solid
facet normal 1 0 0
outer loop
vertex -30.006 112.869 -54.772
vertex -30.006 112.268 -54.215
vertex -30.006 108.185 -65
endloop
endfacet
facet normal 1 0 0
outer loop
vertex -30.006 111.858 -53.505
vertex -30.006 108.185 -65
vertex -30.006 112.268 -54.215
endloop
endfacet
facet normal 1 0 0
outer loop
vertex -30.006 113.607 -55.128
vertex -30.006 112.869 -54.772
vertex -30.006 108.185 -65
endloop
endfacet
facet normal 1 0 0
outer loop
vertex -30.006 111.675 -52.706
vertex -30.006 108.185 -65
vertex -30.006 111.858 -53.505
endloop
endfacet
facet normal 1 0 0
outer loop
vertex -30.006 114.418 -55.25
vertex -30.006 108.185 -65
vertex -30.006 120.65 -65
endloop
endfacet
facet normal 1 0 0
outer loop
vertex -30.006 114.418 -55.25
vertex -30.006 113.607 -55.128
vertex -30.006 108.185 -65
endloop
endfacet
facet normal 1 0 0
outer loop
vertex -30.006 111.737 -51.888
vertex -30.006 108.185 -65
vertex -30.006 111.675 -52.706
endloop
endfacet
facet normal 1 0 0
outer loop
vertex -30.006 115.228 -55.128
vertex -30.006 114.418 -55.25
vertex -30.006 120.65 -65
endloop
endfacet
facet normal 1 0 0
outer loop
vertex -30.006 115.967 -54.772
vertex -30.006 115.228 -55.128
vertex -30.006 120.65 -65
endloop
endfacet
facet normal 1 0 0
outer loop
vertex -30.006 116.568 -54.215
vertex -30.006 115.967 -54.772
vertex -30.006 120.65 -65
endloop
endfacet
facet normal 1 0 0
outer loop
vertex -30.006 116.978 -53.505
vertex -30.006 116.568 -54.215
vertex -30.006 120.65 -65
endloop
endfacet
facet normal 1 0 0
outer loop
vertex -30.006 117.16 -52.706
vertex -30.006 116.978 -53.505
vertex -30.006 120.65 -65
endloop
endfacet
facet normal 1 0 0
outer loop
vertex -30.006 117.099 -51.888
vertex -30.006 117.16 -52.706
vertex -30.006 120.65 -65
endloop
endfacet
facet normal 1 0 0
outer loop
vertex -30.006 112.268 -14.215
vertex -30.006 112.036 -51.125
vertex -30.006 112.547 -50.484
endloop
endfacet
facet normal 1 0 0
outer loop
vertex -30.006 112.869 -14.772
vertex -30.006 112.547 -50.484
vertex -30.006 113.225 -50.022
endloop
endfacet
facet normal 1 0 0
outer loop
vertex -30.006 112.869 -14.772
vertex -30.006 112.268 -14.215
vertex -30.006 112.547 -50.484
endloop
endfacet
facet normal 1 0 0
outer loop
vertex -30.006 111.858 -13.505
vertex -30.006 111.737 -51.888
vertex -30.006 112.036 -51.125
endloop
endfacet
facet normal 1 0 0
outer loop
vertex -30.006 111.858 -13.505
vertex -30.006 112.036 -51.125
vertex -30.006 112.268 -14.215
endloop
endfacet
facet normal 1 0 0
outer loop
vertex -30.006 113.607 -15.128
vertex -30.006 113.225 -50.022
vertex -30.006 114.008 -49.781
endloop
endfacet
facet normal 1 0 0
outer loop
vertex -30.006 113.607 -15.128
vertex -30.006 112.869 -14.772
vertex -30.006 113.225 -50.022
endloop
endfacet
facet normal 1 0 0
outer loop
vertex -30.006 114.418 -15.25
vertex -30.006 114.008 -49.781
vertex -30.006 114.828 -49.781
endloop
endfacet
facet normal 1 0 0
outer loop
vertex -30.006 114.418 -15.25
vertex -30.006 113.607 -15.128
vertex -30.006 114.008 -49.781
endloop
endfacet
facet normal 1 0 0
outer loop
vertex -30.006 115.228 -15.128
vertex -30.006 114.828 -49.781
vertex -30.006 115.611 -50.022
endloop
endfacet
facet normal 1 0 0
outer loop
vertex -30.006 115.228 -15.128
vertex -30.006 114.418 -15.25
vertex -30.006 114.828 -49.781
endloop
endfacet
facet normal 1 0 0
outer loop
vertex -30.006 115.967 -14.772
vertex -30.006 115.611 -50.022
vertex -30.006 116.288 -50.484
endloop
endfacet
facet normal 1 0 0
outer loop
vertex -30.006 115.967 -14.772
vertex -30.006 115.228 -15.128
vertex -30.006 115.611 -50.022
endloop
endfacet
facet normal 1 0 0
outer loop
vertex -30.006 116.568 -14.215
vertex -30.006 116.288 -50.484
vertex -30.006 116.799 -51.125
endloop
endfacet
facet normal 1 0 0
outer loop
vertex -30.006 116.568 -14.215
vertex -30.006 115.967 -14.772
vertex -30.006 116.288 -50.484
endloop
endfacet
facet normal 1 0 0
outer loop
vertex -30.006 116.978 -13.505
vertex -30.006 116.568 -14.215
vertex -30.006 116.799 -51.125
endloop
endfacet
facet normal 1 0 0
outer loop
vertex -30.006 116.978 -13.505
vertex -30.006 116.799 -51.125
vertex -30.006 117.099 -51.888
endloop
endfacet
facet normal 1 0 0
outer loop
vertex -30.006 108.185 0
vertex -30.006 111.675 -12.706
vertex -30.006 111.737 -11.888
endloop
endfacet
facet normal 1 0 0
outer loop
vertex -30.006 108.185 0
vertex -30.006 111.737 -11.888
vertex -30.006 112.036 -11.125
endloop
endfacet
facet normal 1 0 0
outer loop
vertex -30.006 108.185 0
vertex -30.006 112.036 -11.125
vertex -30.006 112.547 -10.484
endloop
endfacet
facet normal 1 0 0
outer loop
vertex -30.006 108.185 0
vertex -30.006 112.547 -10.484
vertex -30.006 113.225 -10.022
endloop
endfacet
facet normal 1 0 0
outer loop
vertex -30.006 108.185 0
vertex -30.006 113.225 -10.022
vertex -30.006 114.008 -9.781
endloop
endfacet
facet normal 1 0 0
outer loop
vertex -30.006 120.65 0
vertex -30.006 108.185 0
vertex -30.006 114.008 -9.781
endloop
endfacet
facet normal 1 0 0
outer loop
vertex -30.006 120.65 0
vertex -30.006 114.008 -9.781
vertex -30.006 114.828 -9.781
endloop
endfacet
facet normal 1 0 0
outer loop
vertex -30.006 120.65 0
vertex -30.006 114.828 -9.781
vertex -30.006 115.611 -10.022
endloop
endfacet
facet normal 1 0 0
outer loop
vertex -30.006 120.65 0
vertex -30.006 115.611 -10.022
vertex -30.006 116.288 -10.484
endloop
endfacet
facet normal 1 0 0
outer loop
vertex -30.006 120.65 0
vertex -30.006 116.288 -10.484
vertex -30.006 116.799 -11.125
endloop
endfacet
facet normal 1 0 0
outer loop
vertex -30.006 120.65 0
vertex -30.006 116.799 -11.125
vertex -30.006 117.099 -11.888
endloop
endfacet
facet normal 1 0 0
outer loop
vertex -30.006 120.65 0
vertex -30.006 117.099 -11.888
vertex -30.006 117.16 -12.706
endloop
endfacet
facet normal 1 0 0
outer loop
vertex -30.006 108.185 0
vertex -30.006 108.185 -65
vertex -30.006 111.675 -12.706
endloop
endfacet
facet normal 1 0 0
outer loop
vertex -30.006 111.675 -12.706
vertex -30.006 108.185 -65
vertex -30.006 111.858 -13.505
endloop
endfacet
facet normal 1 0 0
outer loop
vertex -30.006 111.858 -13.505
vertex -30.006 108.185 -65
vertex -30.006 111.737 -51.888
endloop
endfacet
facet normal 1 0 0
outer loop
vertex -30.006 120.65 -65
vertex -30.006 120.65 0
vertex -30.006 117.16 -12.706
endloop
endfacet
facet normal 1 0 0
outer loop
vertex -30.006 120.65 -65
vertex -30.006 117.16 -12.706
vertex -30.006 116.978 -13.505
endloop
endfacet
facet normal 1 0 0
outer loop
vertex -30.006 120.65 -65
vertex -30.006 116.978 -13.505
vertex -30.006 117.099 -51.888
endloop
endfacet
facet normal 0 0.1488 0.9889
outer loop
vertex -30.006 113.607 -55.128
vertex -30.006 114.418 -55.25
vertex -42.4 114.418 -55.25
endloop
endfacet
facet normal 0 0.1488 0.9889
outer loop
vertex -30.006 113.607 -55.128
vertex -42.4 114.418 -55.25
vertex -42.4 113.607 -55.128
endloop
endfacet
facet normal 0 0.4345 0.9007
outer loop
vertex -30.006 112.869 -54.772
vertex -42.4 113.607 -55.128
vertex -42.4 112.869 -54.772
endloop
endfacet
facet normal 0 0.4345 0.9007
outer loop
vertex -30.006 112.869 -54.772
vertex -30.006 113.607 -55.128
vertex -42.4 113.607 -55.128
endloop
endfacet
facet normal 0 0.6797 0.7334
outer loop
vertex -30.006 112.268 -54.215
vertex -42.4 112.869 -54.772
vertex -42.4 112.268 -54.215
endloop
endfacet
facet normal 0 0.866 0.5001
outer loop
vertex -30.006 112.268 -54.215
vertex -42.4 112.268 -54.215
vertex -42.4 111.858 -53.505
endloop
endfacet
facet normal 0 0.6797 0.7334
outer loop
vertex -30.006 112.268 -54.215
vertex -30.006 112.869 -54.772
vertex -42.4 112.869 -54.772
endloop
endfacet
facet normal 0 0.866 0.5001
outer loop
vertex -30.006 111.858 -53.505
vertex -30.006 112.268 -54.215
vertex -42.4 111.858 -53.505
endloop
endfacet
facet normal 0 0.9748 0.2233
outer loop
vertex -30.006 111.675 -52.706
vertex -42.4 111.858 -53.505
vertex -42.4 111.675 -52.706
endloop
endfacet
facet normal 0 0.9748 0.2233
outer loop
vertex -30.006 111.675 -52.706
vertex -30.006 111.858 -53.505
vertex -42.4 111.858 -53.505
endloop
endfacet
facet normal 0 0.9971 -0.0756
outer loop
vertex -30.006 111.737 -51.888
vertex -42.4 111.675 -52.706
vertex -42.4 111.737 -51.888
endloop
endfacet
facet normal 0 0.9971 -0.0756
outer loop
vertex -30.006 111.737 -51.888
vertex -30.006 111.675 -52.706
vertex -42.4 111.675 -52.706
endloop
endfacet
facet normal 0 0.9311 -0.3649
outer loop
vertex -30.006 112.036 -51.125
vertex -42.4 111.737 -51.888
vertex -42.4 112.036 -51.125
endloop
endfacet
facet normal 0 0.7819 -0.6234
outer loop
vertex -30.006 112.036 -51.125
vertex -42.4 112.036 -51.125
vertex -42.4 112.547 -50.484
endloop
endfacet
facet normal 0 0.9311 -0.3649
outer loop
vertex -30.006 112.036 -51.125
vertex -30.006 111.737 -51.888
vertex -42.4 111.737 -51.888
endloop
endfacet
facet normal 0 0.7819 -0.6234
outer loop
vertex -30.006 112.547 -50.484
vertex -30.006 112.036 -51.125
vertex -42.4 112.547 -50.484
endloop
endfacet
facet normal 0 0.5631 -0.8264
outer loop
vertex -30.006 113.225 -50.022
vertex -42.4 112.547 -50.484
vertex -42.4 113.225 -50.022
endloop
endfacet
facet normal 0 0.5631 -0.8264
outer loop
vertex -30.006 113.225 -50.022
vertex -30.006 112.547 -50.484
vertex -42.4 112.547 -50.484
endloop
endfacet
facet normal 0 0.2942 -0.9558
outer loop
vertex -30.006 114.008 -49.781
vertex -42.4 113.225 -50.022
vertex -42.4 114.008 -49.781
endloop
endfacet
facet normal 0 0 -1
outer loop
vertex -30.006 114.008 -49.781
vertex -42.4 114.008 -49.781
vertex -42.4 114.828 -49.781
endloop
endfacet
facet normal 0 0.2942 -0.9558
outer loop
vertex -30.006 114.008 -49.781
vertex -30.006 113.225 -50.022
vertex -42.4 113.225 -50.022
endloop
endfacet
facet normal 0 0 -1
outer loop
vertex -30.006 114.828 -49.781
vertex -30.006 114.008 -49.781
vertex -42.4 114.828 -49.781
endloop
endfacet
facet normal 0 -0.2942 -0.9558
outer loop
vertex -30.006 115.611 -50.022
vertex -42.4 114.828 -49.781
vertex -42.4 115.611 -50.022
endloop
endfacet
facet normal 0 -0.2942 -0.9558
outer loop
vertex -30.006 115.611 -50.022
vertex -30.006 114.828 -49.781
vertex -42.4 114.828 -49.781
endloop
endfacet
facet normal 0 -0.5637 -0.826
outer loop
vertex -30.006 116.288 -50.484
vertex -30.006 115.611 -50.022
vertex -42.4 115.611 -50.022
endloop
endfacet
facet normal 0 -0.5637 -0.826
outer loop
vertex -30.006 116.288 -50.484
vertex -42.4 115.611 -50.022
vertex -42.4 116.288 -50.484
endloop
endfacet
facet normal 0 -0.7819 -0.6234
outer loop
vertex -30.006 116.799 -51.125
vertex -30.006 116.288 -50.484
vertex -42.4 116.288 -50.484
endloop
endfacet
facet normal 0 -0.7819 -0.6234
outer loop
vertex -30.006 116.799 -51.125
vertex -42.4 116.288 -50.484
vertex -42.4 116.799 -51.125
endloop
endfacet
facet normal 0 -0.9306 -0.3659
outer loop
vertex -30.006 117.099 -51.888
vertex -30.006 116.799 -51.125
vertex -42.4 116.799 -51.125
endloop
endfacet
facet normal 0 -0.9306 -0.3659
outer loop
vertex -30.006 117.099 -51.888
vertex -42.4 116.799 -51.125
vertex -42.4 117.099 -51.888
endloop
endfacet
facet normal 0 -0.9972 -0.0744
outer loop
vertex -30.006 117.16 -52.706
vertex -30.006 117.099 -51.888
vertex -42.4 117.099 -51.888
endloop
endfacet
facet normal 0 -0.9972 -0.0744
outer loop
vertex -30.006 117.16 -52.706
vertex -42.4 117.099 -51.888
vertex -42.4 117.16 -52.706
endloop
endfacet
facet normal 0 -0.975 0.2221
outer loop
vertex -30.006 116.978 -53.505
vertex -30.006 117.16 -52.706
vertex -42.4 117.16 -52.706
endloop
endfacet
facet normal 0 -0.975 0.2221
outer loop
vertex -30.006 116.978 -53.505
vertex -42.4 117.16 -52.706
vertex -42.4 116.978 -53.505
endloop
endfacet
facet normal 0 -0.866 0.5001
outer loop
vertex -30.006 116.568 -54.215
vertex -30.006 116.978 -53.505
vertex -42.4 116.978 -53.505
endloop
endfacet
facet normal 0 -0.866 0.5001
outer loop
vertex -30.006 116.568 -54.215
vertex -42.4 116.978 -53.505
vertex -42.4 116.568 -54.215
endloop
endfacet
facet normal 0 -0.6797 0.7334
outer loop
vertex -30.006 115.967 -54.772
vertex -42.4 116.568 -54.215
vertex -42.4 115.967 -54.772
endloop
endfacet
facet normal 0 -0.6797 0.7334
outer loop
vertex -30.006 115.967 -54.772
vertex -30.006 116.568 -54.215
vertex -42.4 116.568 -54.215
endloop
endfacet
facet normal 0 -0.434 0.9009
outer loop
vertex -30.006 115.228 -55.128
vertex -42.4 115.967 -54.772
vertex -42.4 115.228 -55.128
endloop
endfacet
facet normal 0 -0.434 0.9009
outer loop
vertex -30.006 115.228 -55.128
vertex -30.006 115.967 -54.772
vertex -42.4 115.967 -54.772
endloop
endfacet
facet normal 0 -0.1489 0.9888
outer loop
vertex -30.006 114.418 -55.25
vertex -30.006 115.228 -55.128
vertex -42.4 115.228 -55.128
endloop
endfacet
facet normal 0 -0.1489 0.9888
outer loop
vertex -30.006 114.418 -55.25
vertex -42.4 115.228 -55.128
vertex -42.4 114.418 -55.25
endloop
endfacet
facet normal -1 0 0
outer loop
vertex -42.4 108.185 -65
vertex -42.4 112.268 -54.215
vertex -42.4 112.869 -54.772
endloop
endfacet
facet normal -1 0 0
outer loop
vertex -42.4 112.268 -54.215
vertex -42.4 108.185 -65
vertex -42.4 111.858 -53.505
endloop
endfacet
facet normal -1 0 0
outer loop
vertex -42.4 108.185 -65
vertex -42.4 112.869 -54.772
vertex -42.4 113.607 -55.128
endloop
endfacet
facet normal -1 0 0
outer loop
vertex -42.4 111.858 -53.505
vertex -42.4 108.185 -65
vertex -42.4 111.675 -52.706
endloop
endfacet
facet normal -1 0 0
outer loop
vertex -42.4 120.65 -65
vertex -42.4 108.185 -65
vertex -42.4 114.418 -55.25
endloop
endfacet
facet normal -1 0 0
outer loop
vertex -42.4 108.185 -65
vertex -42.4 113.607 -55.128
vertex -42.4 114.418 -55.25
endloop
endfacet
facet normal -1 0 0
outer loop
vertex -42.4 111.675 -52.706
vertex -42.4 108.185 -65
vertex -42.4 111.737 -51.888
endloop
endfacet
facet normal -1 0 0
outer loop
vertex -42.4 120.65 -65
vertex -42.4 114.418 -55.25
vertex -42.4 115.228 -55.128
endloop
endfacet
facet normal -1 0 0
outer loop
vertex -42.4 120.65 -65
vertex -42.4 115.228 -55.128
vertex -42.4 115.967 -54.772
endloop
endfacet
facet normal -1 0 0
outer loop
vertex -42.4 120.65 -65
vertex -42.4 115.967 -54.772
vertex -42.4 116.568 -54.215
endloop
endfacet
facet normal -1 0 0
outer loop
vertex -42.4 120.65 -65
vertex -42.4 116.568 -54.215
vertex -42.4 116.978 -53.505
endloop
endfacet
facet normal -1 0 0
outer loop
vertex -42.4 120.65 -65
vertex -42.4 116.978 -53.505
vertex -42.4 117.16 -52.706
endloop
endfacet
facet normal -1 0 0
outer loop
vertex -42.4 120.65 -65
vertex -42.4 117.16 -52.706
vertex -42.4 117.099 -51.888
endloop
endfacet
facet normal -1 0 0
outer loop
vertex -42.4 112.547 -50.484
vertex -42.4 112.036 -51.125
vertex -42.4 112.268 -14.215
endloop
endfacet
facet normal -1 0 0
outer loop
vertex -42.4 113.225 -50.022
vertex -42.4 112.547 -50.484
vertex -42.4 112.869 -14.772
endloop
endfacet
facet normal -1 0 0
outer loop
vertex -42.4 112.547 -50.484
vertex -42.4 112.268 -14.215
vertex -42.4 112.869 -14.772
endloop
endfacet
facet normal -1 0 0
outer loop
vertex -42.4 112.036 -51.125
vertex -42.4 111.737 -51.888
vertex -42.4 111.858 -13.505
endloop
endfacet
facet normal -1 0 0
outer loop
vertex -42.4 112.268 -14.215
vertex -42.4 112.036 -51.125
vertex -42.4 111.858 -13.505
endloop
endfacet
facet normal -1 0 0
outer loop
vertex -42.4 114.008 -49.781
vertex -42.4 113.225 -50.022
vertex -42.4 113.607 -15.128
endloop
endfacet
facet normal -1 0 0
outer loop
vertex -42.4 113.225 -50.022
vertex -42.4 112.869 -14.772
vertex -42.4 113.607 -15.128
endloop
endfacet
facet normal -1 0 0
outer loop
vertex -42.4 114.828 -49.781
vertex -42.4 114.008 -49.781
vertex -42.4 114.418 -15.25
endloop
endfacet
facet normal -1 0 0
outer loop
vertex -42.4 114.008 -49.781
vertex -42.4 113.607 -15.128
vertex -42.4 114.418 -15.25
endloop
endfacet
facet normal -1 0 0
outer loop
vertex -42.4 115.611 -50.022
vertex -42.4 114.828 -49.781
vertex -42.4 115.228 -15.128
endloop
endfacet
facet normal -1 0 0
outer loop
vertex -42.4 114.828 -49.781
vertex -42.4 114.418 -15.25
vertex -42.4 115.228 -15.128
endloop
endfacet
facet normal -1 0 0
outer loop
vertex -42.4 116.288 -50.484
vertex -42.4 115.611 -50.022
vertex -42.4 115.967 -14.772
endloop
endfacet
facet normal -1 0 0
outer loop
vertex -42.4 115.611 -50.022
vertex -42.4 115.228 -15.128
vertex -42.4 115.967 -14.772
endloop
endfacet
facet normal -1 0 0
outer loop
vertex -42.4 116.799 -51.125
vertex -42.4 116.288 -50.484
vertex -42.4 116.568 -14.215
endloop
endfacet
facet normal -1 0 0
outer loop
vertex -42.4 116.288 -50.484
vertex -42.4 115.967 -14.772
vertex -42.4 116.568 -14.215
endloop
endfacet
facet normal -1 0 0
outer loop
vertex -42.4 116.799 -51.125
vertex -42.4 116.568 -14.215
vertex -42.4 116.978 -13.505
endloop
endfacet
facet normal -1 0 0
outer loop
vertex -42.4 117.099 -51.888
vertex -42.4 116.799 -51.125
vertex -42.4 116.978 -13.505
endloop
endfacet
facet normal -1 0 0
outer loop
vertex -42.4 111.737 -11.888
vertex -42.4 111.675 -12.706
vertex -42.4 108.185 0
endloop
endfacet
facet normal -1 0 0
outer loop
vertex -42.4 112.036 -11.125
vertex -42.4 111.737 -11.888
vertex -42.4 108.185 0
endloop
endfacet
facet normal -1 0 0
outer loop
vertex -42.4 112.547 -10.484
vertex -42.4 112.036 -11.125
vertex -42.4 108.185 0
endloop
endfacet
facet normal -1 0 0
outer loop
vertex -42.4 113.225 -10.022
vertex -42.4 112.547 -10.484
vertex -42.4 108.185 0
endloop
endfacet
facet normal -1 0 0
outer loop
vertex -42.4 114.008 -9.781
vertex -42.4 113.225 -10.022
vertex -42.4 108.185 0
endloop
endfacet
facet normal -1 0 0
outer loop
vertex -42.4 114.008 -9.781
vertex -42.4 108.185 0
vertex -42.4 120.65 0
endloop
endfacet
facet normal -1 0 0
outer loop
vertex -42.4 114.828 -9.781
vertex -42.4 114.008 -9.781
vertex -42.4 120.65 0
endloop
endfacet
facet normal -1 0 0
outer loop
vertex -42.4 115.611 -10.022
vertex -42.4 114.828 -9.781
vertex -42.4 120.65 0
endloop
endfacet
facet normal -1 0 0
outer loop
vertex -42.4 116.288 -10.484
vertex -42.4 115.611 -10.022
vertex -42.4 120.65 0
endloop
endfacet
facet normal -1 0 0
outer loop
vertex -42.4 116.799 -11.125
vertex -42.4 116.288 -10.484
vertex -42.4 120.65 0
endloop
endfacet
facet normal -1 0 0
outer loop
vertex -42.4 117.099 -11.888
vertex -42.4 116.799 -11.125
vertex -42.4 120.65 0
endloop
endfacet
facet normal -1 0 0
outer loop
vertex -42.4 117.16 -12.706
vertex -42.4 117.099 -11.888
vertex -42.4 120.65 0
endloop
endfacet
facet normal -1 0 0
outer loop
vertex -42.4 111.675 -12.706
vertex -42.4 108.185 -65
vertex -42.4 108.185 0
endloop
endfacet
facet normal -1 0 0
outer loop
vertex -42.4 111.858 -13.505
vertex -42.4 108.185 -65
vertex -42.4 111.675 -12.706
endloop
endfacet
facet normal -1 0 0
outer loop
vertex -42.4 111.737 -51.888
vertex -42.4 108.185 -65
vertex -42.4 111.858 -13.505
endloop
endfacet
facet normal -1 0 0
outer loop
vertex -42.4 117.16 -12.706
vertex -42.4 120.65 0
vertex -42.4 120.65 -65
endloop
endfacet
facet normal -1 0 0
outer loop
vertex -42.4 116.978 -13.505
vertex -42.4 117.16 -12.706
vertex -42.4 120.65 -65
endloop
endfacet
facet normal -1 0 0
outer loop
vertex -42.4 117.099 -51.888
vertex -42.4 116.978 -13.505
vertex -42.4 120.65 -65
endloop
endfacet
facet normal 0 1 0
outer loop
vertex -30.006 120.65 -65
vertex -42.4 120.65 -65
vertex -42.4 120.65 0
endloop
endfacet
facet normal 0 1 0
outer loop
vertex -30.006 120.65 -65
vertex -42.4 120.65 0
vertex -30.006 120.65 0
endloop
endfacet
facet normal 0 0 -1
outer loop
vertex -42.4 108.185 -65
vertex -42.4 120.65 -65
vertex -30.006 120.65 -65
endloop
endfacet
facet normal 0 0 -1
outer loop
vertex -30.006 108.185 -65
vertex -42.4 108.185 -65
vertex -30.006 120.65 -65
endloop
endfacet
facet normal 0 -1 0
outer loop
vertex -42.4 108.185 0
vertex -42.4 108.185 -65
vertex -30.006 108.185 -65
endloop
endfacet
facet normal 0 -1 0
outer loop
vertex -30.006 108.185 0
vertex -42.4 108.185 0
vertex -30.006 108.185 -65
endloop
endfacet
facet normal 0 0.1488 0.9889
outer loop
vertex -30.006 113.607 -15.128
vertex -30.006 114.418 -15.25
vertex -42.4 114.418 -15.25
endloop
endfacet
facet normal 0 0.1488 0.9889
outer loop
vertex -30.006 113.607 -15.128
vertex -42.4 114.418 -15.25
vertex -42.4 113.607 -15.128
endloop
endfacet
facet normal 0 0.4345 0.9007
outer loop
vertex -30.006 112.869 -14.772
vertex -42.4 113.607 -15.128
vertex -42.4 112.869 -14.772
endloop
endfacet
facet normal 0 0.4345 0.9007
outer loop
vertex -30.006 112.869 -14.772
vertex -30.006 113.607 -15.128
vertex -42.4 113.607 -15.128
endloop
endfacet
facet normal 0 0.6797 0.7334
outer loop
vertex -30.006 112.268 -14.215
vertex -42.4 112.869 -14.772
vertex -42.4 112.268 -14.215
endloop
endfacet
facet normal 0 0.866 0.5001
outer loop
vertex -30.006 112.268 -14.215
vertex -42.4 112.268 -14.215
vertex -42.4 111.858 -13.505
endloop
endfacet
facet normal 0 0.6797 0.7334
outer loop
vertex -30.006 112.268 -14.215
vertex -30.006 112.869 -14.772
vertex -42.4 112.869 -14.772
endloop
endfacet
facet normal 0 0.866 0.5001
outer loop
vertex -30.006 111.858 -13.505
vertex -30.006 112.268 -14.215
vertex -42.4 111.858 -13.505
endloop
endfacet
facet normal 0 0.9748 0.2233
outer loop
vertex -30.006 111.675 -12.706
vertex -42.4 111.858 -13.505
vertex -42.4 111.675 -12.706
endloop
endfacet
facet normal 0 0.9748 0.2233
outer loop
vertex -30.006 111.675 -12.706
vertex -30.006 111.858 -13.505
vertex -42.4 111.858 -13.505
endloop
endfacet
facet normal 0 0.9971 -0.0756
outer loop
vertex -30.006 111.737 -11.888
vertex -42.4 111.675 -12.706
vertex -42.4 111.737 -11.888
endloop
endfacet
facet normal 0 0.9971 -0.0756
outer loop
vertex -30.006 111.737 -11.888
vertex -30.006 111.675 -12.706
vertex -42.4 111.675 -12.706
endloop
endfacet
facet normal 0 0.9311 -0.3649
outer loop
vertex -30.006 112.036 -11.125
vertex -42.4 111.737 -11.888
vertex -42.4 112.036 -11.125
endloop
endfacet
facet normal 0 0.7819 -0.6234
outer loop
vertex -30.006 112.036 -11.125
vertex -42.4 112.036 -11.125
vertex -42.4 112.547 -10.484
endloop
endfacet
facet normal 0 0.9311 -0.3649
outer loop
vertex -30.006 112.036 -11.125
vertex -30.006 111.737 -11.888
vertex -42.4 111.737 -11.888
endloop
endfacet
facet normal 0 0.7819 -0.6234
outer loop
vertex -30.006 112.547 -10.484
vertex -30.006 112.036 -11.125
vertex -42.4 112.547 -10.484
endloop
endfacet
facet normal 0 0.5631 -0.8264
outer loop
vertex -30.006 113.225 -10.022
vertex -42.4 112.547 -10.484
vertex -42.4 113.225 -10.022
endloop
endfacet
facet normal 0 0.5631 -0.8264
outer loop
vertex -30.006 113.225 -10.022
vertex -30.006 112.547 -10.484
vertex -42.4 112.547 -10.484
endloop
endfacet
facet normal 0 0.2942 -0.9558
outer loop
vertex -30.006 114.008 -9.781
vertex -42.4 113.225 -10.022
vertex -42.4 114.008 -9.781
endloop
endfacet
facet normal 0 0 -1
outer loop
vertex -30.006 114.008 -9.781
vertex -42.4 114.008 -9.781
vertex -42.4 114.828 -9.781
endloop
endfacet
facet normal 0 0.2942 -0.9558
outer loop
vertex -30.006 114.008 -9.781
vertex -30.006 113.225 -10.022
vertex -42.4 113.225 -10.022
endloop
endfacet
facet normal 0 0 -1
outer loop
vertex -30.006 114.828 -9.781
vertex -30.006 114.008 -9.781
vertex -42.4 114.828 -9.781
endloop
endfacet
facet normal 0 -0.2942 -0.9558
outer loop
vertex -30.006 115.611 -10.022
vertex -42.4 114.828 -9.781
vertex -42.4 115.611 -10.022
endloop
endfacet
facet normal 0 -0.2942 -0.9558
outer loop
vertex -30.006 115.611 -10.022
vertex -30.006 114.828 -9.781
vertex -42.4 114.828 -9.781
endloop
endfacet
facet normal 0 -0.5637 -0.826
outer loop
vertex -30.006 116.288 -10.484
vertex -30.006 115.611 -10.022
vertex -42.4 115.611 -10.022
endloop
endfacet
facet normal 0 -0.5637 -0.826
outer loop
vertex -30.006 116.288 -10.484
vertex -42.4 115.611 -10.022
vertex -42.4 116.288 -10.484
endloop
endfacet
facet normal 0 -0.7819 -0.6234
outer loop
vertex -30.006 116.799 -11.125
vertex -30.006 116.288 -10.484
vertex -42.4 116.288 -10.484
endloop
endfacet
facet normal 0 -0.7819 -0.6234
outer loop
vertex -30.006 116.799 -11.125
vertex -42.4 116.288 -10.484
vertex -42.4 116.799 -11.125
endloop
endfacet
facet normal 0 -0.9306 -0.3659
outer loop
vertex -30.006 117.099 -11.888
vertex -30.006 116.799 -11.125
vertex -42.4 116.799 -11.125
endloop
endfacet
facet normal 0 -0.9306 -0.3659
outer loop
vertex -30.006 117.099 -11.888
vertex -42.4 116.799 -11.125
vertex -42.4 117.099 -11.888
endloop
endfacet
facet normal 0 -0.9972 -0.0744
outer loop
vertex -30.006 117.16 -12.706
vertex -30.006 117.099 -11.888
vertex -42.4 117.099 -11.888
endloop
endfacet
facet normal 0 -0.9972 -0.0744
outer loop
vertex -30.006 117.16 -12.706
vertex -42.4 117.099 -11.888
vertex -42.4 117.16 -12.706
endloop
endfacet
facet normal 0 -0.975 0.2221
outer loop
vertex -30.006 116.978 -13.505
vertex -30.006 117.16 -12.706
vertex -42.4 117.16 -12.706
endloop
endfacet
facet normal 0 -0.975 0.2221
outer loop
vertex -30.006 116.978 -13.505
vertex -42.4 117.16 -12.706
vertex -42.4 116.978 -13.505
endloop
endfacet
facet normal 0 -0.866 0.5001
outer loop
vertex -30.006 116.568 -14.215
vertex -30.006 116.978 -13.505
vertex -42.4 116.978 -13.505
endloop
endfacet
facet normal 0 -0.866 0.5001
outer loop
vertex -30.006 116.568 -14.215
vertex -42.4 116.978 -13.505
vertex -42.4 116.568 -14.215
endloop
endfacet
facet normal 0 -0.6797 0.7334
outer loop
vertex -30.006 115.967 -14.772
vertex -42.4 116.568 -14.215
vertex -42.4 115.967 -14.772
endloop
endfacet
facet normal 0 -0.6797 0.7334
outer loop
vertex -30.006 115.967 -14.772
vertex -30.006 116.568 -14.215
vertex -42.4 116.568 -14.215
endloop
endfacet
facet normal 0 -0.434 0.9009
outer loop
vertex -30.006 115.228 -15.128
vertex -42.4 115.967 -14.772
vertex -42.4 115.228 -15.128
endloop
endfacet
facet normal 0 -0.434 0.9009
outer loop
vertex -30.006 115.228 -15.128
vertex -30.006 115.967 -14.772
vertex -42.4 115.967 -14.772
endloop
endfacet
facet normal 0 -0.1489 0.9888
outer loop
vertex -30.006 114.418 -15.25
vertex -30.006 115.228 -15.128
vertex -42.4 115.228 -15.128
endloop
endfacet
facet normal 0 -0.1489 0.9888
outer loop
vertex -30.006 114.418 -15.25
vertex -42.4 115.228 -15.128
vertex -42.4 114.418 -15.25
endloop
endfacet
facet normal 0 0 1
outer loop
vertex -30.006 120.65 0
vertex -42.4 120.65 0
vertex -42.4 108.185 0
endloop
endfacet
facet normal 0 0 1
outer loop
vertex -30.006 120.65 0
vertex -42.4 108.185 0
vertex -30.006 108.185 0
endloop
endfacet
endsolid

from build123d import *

# Parameters (mm, degrees)
SKETCH1_W           = 12.394273752
SKETCH1_H           = 12.46455313
BOSS_EXTRUDE1_DEPTH = 65
CUT_EXTRUDE1_START  = -12.394274
SKETCH2_R           = 2.75
CUT_EXTRUDE1_DEPTH  = 12.394274


with BuildPart() as part:
    # Sketch1 → Boss-Extrude1 (new body)
    with BuildSketch(Plane.XY):
        with Locations((-36.202863124, 114.417723435)):
            Rectangle(SKETCH1_W, SKETCH1_H)
    extrude(amount=-BOSS_EXTRUDE1_DEPTH)

    # Sketch2 → Cut-Extrude1 (cut)
    with BuildSketch(Plane.ZY.offset(42.4).offset(CUT_EXTRUDE1_START)):
        with Locations(Location((-52.5, 114.417723435, 0), (0, 0, 180))):
            Circle(SKETCH2_R)
        with Locations(Location((-12.5, 114.417723435, 0), (0, 0, 180))):
            Circle(SKETCH2_R)
    extrude(amount=CUT_EXTRUDE1_DEPTH, mode=Mode.SUBTRACT)


solid = part.part
